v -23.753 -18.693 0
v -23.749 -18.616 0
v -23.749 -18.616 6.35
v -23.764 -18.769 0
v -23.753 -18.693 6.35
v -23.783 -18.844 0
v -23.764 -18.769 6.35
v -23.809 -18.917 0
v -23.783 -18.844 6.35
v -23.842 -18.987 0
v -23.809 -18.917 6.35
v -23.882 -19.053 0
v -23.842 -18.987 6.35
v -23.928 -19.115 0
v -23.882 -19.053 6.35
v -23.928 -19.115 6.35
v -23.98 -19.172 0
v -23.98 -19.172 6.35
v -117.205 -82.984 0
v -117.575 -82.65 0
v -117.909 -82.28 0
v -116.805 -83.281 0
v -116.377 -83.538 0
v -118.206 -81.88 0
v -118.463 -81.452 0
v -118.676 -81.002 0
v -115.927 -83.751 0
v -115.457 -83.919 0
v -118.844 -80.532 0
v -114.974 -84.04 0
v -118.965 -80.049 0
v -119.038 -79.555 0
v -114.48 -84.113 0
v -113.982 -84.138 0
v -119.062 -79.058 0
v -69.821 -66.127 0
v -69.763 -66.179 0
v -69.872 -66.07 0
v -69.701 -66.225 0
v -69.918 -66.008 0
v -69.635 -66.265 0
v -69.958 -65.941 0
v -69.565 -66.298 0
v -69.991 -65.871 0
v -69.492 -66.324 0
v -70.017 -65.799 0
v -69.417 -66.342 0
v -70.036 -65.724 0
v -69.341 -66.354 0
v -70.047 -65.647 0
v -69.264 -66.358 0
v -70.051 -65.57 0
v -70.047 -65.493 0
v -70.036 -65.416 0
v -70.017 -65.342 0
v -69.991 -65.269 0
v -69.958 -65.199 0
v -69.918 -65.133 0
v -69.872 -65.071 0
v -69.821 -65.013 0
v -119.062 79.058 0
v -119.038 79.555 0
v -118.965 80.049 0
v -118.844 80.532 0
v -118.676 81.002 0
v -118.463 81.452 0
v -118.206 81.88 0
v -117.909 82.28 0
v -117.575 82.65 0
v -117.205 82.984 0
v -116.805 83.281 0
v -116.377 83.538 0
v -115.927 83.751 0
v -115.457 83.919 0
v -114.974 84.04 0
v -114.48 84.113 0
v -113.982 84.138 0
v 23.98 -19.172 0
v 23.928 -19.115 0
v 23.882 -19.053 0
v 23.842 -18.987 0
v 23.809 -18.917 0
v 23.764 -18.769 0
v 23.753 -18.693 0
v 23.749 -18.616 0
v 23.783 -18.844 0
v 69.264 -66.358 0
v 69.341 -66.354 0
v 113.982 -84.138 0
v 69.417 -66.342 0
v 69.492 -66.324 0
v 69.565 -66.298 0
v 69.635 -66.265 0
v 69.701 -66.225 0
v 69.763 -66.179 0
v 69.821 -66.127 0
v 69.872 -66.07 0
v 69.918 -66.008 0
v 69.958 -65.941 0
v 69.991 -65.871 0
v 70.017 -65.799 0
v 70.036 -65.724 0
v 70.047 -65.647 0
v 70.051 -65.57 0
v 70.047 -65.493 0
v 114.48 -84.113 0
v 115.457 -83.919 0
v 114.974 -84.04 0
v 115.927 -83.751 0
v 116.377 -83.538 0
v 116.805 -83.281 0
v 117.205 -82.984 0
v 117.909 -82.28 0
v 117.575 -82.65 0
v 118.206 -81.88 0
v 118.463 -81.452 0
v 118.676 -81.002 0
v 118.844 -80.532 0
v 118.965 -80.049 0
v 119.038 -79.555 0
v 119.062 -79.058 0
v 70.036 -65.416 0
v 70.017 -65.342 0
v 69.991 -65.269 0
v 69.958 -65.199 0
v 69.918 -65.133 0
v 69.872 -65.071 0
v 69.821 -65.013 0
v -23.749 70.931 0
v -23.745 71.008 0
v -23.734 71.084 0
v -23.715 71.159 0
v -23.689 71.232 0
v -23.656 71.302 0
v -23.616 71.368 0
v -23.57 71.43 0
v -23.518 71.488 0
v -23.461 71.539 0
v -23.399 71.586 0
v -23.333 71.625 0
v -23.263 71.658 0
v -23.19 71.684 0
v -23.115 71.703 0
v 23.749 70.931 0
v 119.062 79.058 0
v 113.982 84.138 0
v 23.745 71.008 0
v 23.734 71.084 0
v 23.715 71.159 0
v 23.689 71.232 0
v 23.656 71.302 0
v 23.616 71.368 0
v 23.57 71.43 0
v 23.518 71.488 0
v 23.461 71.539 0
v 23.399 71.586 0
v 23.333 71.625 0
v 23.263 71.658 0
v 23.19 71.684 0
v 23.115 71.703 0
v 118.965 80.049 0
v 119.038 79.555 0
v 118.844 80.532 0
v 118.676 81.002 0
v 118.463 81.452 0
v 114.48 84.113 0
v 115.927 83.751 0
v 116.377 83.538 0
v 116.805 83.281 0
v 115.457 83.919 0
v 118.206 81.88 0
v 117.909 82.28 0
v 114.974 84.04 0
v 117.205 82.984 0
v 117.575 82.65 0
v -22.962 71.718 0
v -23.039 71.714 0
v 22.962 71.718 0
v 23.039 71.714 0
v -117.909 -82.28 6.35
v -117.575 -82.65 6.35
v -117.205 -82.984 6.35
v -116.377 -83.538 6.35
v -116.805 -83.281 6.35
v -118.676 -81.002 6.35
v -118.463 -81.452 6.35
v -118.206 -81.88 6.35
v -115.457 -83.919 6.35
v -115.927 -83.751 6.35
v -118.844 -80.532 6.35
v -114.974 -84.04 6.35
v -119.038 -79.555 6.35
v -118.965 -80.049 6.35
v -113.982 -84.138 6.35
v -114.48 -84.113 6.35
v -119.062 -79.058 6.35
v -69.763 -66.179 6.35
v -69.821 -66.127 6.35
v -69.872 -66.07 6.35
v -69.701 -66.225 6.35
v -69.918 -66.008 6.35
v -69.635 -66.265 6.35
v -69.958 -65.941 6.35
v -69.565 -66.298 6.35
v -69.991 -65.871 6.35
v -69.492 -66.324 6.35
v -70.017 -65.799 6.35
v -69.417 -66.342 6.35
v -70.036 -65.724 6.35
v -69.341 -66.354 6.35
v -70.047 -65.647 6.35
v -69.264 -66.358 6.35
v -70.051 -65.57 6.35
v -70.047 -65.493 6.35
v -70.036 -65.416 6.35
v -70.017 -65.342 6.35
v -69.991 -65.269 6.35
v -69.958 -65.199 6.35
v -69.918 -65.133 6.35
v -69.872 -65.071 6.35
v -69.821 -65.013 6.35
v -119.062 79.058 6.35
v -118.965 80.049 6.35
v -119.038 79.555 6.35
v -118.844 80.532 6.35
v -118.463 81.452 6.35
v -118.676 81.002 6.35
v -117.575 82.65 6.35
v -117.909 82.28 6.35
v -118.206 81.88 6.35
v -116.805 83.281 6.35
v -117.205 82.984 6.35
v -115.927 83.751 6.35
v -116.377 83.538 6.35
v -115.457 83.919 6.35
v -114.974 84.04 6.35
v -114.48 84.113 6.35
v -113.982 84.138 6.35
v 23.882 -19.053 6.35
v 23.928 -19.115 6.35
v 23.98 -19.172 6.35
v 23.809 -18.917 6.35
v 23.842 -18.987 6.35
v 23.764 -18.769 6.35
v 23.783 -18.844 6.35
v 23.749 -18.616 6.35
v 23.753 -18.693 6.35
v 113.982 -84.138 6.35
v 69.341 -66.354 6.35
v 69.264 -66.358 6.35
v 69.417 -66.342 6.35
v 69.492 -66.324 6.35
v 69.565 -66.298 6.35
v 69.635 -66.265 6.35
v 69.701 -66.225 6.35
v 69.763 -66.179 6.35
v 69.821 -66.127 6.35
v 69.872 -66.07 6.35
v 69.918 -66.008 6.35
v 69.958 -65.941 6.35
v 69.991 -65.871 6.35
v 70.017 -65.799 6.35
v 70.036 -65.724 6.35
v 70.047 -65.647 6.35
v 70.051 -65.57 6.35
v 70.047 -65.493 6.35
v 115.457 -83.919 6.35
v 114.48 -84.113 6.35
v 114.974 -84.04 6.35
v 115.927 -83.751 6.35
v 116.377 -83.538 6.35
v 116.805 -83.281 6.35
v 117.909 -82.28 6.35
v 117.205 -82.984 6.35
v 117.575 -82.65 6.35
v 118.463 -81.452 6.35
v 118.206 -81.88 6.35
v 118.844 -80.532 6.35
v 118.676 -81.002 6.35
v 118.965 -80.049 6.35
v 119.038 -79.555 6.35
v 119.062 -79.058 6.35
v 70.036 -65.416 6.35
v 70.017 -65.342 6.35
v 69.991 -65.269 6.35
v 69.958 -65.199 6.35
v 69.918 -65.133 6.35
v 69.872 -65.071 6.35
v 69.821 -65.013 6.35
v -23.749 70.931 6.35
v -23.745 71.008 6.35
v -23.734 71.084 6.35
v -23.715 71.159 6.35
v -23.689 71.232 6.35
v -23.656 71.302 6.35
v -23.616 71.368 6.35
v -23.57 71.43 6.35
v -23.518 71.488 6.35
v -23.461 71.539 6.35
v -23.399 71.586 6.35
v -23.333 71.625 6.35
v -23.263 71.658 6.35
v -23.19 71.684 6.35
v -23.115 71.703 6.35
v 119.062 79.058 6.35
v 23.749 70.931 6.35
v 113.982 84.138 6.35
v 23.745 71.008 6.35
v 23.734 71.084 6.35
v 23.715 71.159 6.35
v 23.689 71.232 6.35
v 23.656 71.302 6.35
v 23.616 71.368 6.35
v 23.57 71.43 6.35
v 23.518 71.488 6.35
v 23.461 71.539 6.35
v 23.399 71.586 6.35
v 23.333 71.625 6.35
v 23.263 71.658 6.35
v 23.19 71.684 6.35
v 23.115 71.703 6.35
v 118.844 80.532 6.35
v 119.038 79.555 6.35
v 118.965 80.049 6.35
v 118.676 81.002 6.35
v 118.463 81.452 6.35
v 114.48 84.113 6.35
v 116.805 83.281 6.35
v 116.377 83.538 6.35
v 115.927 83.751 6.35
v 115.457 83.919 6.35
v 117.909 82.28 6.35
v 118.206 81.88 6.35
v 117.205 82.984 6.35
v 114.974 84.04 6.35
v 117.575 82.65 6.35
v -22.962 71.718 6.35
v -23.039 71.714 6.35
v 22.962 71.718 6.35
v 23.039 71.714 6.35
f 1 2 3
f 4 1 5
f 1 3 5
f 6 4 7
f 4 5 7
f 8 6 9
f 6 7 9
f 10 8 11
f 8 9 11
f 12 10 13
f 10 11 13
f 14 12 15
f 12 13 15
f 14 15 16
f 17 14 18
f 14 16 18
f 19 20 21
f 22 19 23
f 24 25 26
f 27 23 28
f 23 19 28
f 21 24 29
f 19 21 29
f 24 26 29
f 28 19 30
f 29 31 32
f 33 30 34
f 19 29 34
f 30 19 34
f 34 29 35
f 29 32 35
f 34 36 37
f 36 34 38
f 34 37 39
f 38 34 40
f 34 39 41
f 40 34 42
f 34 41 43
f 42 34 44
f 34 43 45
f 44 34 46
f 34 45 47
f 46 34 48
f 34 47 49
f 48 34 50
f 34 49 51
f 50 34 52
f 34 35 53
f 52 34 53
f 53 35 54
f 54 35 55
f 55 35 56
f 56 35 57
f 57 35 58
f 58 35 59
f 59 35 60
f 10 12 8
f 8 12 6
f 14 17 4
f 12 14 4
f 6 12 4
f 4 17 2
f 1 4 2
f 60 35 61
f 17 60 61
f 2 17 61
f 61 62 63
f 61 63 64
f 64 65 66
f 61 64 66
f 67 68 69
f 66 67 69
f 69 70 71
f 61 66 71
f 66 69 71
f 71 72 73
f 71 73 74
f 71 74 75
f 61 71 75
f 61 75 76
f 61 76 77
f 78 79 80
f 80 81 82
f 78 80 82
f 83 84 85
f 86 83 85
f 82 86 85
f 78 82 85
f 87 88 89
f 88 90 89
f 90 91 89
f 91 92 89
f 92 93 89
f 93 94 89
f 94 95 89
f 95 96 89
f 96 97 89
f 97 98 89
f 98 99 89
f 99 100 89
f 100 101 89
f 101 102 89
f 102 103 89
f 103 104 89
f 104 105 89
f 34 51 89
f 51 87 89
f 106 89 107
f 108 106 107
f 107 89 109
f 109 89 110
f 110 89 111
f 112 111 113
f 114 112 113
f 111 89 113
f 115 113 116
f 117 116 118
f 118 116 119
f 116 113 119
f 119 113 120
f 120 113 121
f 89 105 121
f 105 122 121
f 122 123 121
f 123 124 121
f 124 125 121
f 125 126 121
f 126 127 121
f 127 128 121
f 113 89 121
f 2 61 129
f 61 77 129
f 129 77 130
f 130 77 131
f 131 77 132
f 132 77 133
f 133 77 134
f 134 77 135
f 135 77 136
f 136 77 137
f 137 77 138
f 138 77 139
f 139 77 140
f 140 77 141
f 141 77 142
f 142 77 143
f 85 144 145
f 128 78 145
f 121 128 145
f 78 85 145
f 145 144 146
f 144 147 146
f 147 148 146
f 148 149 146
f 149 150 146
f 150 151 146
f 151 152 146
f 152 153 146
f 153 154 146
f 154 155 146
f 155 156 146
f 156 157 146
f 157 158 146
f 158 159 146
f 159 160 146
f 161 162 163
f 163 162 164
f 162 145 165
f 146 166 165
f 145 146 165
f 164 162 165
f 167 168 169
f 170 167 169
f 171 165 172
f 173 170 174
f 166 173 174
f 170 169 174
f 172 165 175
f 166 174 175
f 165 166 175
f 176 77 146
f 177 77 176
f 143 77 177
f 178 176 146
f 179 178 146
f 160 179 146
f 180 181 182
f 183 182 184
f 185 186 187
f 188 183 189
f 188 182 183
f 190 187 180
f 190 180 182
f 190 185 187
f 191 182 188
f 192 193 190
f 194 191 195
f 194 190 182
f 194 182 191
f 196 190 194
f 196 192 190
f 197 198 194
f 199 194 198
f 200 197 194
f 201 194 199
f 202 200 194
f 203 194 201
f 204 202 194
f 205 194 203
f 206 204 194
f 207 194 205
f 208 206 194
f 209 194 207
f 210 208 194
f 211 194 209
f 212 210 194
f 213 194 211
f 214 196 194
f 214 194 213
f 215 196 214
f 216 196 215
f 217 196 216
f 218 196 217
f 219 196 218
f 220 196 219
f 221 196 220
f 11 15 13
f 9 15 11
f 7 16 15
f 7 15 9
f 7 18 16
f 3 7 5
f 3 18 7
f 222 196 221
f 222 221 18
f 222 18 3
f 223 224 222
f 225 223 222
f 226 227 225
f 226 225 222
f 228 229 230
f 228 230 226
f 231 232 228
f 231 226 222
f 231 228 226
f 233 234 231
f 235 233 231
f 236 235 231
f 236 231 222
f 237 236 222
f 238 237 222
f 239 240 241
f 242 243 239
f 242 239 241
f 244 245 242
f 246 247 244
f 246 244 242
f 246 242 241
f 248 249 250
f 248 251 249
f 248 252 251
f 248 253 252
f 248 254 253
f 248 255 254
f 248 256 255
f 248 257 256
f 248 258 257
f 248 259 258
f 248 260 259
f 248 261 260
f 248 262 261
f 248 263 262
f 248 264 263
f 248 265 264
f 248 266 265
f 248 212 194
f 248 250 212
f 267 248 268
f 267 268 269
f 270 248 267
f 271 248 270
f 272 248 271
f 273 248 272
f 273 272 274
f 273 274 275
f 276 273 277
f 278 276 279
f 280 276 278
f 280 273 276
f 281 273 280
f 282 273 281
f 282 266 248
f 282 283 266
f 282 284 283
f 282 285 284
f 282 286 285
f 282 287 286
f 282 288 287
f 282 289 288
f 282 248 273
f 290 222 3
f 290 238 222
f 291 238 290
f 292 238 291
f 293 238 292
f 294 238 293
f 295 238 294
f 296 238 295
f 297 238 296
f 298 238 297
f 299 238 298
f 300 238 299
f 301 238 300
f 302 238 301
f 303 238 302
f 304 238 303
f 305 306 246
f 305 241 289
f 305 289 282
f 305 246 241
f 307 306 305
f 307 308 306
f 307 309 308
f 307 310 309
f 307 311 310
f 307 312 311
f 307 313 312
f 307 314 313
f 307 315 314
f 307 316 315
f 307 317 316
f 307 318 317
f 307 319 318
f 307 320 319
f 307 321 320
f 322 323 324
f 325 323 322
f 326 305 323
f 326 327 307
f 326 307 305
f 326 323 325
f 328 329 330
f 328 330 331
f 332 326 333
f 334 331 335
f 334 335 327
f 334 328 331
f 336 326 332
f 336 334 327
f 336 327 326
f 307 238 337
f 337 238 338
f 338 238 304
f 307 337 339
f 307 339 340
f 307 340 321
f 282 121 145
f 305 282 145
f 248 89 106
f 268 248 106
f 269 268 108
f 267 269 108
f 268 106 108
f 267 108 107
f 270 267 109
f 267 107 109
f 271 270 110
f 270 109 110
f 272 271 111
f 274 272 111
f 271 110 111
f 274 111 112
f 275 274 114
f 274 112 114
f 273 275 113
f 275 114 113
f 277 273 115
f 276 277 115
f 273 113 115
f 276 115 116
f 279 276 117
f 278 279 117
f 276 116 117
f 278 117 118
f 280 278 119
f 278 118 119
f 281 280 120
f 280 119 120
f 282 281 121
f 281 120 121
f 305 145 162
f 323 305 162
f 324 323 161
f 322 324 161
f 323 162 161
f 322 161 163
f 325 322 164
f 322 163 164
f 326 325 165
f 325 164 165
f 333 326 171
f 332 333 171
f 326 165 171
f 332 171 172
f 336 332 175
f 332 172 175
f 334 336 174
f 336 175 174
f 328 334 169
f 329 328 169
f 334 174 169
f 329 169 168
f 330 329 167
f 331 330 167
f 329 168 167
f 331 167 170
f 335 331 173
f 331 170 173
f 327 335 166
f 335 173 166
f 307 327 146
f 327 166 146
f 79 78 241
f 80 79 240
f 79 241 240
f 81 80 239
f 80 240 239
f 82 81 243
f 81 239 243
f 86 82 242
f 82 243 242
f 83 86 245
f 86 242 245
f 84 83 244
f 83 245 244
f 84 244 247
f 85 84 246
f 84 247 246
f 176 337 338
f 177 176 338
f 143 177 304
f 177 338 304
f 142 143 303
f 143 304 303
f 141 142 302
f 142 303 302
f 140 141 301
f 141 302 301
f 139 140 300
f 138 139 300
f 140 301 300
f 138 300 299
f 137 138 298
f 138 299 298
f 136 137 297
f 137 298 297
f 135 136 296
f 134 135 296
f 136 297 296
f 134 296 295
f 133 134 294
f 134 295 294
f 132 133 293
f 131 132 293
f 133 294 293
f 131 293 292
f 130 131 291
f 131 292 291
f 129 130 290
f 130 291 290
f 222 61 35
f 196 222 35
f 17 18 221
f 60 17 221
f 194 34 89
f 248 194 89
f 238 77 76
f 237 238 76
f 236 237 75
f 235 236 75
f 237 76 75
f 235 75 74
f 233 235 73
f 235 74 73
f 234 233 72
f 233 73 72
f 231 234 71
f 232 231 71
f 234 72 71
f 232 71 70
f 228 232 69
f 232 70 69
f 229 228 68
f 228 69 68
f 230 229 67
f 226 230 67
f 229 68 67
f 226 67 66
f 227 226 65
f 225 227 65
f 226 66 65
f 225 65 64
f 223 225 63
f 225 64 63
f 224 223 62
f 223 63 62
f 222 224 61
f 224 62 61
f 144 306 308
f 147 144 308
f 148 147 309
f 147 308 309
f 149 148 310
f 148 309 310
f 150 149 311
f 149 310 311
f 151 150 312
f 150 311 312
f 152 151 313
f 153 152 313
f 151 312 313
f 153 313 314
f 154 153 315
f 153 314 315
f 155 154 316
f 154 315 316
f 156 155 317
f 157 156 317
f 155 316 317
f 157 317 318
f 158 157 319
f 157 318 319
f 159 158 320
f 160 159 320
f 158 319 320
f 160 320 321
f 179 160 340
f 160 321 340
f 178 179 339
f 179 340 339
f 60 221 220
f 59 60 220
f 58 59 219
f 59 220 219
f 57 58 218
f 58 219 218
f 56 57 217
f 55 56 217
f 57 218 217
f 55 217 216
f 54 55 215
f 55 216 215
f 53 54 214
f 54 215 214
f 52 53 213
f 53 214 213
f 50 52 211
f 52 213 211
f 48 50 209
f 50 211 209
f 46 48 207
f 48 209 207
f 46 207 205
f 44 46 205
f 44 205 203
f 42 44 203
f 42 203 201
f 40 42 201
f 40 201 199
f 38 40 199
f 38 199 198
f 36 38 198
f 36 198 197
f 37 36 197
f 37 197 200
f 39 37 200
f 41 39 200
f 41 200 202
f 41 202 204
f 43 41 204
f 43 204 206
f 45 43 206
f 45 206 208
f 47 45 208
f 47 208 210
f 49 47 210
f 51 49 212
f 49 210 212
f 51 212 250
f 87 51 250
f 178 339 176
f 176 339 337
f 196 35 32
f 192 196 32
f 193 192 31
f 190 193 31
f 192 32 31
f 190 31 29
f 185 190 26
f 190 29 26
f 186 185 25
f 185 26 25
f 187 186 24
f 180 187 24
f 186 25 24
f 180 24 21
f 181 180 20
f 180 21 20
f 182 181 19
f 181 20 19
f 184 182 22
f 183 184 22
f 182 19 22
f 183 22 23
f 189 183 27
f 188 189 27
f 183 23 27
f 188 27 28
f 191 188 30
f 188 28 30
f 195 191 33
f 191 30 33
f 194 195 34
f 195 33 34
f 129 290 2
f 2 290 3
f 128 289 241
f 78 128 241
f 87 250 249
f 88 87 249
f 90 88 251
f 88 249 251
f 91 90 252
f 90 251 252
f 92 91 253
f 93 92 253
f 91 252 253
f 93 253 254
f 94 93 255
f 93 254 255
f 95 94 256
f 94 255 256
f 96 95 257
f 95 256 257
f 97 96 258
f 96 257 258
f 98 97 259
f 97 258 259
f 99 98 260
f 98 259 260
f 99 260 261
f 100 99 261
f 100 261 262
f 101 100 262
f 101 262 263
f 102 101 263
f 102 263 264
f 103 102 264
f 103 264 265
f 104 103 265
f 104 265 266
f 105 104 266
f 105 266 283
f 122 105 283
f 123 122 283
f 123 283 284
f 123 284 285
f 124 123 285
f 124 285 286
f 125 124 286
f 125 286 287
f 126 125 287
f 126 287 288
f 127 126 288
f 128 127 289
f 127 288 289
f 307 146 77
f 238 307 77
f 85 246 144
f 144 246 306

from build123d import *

# Parameters (mm, degrees)
F1_DEPTH = 6.35
F3_DEPTH = 25.4
F5_DEPTH = 25.4


with BuildPart() as f1:
    # F0 (on Top) → F1 (new body)
    with BuildSketch(Plane.XY):
        with BuildLine():
            Line((113.9825, 84.1375), (-113.9825, 84.1375))
            ThreePointArc((-113.9825, 84.1375), (-117.574602, 82.649602), (-119.0625, 79.0575))
            Line((-119.0625, 79.0575), (-119.0625, -79.0575))
            ThreePointArc((-119.0625, -79.0575), (-117.574602, -82.649602), (-113.9825, -84.1375))
            Line((-113.9825, -84.1375), (113.9825, -84.1375))
            ThreePointArc((113.9825, -84.1375), (117.574602, -82.649602), (119.0625, -79.0575))
            Line((119.0625, -79.0575), (119.0625, 79.0575))
            ThreePointArc((119.0625, 79.0575), (117.574602, 82.649602), (113.9825, 84.1375))
        make_face()
    extrude(amount=F1_DEPTH)

    # F2 (on face) → F3 (cut)
    with BuildSketch(Plane.XY.offset(6.35)):
        Polygon((22.479, 70.448201), (0, 70.448201), (-22.479, 70.448201), (-22.479, -19.467799), (-68.098701, -65.0875), (0, -65.0875), (68.098701, -65.0875), (22.479, -19.467799), align=None)
    extrude(amount=-F3_DEPTH, mode=Mode.SUBTRACT)

    # F4 (on face) → F5 (cut)
    with BuildSketch(Plane.XY.offset(6.35)):
        with BuildLine():
            ThreePointArc((-22.9616, 71.718201), (-23.518376, 71.487577), (-23.749, 70.930801))
            Line((-23.749, 70.930801), (-23.749, -18.615596))
            ThreePointArc((-23.749, -18.615596), (-23.808937, -18.916921), (-23.979624, -19.172372))
            Line((-23.979624, -19.172372), (-69.820576, -65.013324))
            ThreePointArc((-69.820576, -65.013324), (-69.991263, -65.871425), (-69.263801, -66.3575))
            Line((-69.263801, -66.3575), (69.263801, -66.3575))
            ThreePointArc((69.263801, -66.3575), (69.991263, -65.871425), (69.820576, -65.013324))
            Line((69.820576, -65.013324), (23.979624, -19.172372))
            ThreePointArc((23.979624, -19.172372), (23.808937, -18.916921), (23.749, -18.615596))
            Line((23.749, -18.615596), (23.749, 70.930801))
            ThreePointArc((23.749, 70.930801), (23.518376, 71.487577), (22.9616, 71.718201))
            Line((22.9616, 71.718201), (-22.9616, 71.718201))
        make_face()
    extrude(amount=-F5_DEPTH, mode=Mode.SUBTRACT)


solid = f1.part
